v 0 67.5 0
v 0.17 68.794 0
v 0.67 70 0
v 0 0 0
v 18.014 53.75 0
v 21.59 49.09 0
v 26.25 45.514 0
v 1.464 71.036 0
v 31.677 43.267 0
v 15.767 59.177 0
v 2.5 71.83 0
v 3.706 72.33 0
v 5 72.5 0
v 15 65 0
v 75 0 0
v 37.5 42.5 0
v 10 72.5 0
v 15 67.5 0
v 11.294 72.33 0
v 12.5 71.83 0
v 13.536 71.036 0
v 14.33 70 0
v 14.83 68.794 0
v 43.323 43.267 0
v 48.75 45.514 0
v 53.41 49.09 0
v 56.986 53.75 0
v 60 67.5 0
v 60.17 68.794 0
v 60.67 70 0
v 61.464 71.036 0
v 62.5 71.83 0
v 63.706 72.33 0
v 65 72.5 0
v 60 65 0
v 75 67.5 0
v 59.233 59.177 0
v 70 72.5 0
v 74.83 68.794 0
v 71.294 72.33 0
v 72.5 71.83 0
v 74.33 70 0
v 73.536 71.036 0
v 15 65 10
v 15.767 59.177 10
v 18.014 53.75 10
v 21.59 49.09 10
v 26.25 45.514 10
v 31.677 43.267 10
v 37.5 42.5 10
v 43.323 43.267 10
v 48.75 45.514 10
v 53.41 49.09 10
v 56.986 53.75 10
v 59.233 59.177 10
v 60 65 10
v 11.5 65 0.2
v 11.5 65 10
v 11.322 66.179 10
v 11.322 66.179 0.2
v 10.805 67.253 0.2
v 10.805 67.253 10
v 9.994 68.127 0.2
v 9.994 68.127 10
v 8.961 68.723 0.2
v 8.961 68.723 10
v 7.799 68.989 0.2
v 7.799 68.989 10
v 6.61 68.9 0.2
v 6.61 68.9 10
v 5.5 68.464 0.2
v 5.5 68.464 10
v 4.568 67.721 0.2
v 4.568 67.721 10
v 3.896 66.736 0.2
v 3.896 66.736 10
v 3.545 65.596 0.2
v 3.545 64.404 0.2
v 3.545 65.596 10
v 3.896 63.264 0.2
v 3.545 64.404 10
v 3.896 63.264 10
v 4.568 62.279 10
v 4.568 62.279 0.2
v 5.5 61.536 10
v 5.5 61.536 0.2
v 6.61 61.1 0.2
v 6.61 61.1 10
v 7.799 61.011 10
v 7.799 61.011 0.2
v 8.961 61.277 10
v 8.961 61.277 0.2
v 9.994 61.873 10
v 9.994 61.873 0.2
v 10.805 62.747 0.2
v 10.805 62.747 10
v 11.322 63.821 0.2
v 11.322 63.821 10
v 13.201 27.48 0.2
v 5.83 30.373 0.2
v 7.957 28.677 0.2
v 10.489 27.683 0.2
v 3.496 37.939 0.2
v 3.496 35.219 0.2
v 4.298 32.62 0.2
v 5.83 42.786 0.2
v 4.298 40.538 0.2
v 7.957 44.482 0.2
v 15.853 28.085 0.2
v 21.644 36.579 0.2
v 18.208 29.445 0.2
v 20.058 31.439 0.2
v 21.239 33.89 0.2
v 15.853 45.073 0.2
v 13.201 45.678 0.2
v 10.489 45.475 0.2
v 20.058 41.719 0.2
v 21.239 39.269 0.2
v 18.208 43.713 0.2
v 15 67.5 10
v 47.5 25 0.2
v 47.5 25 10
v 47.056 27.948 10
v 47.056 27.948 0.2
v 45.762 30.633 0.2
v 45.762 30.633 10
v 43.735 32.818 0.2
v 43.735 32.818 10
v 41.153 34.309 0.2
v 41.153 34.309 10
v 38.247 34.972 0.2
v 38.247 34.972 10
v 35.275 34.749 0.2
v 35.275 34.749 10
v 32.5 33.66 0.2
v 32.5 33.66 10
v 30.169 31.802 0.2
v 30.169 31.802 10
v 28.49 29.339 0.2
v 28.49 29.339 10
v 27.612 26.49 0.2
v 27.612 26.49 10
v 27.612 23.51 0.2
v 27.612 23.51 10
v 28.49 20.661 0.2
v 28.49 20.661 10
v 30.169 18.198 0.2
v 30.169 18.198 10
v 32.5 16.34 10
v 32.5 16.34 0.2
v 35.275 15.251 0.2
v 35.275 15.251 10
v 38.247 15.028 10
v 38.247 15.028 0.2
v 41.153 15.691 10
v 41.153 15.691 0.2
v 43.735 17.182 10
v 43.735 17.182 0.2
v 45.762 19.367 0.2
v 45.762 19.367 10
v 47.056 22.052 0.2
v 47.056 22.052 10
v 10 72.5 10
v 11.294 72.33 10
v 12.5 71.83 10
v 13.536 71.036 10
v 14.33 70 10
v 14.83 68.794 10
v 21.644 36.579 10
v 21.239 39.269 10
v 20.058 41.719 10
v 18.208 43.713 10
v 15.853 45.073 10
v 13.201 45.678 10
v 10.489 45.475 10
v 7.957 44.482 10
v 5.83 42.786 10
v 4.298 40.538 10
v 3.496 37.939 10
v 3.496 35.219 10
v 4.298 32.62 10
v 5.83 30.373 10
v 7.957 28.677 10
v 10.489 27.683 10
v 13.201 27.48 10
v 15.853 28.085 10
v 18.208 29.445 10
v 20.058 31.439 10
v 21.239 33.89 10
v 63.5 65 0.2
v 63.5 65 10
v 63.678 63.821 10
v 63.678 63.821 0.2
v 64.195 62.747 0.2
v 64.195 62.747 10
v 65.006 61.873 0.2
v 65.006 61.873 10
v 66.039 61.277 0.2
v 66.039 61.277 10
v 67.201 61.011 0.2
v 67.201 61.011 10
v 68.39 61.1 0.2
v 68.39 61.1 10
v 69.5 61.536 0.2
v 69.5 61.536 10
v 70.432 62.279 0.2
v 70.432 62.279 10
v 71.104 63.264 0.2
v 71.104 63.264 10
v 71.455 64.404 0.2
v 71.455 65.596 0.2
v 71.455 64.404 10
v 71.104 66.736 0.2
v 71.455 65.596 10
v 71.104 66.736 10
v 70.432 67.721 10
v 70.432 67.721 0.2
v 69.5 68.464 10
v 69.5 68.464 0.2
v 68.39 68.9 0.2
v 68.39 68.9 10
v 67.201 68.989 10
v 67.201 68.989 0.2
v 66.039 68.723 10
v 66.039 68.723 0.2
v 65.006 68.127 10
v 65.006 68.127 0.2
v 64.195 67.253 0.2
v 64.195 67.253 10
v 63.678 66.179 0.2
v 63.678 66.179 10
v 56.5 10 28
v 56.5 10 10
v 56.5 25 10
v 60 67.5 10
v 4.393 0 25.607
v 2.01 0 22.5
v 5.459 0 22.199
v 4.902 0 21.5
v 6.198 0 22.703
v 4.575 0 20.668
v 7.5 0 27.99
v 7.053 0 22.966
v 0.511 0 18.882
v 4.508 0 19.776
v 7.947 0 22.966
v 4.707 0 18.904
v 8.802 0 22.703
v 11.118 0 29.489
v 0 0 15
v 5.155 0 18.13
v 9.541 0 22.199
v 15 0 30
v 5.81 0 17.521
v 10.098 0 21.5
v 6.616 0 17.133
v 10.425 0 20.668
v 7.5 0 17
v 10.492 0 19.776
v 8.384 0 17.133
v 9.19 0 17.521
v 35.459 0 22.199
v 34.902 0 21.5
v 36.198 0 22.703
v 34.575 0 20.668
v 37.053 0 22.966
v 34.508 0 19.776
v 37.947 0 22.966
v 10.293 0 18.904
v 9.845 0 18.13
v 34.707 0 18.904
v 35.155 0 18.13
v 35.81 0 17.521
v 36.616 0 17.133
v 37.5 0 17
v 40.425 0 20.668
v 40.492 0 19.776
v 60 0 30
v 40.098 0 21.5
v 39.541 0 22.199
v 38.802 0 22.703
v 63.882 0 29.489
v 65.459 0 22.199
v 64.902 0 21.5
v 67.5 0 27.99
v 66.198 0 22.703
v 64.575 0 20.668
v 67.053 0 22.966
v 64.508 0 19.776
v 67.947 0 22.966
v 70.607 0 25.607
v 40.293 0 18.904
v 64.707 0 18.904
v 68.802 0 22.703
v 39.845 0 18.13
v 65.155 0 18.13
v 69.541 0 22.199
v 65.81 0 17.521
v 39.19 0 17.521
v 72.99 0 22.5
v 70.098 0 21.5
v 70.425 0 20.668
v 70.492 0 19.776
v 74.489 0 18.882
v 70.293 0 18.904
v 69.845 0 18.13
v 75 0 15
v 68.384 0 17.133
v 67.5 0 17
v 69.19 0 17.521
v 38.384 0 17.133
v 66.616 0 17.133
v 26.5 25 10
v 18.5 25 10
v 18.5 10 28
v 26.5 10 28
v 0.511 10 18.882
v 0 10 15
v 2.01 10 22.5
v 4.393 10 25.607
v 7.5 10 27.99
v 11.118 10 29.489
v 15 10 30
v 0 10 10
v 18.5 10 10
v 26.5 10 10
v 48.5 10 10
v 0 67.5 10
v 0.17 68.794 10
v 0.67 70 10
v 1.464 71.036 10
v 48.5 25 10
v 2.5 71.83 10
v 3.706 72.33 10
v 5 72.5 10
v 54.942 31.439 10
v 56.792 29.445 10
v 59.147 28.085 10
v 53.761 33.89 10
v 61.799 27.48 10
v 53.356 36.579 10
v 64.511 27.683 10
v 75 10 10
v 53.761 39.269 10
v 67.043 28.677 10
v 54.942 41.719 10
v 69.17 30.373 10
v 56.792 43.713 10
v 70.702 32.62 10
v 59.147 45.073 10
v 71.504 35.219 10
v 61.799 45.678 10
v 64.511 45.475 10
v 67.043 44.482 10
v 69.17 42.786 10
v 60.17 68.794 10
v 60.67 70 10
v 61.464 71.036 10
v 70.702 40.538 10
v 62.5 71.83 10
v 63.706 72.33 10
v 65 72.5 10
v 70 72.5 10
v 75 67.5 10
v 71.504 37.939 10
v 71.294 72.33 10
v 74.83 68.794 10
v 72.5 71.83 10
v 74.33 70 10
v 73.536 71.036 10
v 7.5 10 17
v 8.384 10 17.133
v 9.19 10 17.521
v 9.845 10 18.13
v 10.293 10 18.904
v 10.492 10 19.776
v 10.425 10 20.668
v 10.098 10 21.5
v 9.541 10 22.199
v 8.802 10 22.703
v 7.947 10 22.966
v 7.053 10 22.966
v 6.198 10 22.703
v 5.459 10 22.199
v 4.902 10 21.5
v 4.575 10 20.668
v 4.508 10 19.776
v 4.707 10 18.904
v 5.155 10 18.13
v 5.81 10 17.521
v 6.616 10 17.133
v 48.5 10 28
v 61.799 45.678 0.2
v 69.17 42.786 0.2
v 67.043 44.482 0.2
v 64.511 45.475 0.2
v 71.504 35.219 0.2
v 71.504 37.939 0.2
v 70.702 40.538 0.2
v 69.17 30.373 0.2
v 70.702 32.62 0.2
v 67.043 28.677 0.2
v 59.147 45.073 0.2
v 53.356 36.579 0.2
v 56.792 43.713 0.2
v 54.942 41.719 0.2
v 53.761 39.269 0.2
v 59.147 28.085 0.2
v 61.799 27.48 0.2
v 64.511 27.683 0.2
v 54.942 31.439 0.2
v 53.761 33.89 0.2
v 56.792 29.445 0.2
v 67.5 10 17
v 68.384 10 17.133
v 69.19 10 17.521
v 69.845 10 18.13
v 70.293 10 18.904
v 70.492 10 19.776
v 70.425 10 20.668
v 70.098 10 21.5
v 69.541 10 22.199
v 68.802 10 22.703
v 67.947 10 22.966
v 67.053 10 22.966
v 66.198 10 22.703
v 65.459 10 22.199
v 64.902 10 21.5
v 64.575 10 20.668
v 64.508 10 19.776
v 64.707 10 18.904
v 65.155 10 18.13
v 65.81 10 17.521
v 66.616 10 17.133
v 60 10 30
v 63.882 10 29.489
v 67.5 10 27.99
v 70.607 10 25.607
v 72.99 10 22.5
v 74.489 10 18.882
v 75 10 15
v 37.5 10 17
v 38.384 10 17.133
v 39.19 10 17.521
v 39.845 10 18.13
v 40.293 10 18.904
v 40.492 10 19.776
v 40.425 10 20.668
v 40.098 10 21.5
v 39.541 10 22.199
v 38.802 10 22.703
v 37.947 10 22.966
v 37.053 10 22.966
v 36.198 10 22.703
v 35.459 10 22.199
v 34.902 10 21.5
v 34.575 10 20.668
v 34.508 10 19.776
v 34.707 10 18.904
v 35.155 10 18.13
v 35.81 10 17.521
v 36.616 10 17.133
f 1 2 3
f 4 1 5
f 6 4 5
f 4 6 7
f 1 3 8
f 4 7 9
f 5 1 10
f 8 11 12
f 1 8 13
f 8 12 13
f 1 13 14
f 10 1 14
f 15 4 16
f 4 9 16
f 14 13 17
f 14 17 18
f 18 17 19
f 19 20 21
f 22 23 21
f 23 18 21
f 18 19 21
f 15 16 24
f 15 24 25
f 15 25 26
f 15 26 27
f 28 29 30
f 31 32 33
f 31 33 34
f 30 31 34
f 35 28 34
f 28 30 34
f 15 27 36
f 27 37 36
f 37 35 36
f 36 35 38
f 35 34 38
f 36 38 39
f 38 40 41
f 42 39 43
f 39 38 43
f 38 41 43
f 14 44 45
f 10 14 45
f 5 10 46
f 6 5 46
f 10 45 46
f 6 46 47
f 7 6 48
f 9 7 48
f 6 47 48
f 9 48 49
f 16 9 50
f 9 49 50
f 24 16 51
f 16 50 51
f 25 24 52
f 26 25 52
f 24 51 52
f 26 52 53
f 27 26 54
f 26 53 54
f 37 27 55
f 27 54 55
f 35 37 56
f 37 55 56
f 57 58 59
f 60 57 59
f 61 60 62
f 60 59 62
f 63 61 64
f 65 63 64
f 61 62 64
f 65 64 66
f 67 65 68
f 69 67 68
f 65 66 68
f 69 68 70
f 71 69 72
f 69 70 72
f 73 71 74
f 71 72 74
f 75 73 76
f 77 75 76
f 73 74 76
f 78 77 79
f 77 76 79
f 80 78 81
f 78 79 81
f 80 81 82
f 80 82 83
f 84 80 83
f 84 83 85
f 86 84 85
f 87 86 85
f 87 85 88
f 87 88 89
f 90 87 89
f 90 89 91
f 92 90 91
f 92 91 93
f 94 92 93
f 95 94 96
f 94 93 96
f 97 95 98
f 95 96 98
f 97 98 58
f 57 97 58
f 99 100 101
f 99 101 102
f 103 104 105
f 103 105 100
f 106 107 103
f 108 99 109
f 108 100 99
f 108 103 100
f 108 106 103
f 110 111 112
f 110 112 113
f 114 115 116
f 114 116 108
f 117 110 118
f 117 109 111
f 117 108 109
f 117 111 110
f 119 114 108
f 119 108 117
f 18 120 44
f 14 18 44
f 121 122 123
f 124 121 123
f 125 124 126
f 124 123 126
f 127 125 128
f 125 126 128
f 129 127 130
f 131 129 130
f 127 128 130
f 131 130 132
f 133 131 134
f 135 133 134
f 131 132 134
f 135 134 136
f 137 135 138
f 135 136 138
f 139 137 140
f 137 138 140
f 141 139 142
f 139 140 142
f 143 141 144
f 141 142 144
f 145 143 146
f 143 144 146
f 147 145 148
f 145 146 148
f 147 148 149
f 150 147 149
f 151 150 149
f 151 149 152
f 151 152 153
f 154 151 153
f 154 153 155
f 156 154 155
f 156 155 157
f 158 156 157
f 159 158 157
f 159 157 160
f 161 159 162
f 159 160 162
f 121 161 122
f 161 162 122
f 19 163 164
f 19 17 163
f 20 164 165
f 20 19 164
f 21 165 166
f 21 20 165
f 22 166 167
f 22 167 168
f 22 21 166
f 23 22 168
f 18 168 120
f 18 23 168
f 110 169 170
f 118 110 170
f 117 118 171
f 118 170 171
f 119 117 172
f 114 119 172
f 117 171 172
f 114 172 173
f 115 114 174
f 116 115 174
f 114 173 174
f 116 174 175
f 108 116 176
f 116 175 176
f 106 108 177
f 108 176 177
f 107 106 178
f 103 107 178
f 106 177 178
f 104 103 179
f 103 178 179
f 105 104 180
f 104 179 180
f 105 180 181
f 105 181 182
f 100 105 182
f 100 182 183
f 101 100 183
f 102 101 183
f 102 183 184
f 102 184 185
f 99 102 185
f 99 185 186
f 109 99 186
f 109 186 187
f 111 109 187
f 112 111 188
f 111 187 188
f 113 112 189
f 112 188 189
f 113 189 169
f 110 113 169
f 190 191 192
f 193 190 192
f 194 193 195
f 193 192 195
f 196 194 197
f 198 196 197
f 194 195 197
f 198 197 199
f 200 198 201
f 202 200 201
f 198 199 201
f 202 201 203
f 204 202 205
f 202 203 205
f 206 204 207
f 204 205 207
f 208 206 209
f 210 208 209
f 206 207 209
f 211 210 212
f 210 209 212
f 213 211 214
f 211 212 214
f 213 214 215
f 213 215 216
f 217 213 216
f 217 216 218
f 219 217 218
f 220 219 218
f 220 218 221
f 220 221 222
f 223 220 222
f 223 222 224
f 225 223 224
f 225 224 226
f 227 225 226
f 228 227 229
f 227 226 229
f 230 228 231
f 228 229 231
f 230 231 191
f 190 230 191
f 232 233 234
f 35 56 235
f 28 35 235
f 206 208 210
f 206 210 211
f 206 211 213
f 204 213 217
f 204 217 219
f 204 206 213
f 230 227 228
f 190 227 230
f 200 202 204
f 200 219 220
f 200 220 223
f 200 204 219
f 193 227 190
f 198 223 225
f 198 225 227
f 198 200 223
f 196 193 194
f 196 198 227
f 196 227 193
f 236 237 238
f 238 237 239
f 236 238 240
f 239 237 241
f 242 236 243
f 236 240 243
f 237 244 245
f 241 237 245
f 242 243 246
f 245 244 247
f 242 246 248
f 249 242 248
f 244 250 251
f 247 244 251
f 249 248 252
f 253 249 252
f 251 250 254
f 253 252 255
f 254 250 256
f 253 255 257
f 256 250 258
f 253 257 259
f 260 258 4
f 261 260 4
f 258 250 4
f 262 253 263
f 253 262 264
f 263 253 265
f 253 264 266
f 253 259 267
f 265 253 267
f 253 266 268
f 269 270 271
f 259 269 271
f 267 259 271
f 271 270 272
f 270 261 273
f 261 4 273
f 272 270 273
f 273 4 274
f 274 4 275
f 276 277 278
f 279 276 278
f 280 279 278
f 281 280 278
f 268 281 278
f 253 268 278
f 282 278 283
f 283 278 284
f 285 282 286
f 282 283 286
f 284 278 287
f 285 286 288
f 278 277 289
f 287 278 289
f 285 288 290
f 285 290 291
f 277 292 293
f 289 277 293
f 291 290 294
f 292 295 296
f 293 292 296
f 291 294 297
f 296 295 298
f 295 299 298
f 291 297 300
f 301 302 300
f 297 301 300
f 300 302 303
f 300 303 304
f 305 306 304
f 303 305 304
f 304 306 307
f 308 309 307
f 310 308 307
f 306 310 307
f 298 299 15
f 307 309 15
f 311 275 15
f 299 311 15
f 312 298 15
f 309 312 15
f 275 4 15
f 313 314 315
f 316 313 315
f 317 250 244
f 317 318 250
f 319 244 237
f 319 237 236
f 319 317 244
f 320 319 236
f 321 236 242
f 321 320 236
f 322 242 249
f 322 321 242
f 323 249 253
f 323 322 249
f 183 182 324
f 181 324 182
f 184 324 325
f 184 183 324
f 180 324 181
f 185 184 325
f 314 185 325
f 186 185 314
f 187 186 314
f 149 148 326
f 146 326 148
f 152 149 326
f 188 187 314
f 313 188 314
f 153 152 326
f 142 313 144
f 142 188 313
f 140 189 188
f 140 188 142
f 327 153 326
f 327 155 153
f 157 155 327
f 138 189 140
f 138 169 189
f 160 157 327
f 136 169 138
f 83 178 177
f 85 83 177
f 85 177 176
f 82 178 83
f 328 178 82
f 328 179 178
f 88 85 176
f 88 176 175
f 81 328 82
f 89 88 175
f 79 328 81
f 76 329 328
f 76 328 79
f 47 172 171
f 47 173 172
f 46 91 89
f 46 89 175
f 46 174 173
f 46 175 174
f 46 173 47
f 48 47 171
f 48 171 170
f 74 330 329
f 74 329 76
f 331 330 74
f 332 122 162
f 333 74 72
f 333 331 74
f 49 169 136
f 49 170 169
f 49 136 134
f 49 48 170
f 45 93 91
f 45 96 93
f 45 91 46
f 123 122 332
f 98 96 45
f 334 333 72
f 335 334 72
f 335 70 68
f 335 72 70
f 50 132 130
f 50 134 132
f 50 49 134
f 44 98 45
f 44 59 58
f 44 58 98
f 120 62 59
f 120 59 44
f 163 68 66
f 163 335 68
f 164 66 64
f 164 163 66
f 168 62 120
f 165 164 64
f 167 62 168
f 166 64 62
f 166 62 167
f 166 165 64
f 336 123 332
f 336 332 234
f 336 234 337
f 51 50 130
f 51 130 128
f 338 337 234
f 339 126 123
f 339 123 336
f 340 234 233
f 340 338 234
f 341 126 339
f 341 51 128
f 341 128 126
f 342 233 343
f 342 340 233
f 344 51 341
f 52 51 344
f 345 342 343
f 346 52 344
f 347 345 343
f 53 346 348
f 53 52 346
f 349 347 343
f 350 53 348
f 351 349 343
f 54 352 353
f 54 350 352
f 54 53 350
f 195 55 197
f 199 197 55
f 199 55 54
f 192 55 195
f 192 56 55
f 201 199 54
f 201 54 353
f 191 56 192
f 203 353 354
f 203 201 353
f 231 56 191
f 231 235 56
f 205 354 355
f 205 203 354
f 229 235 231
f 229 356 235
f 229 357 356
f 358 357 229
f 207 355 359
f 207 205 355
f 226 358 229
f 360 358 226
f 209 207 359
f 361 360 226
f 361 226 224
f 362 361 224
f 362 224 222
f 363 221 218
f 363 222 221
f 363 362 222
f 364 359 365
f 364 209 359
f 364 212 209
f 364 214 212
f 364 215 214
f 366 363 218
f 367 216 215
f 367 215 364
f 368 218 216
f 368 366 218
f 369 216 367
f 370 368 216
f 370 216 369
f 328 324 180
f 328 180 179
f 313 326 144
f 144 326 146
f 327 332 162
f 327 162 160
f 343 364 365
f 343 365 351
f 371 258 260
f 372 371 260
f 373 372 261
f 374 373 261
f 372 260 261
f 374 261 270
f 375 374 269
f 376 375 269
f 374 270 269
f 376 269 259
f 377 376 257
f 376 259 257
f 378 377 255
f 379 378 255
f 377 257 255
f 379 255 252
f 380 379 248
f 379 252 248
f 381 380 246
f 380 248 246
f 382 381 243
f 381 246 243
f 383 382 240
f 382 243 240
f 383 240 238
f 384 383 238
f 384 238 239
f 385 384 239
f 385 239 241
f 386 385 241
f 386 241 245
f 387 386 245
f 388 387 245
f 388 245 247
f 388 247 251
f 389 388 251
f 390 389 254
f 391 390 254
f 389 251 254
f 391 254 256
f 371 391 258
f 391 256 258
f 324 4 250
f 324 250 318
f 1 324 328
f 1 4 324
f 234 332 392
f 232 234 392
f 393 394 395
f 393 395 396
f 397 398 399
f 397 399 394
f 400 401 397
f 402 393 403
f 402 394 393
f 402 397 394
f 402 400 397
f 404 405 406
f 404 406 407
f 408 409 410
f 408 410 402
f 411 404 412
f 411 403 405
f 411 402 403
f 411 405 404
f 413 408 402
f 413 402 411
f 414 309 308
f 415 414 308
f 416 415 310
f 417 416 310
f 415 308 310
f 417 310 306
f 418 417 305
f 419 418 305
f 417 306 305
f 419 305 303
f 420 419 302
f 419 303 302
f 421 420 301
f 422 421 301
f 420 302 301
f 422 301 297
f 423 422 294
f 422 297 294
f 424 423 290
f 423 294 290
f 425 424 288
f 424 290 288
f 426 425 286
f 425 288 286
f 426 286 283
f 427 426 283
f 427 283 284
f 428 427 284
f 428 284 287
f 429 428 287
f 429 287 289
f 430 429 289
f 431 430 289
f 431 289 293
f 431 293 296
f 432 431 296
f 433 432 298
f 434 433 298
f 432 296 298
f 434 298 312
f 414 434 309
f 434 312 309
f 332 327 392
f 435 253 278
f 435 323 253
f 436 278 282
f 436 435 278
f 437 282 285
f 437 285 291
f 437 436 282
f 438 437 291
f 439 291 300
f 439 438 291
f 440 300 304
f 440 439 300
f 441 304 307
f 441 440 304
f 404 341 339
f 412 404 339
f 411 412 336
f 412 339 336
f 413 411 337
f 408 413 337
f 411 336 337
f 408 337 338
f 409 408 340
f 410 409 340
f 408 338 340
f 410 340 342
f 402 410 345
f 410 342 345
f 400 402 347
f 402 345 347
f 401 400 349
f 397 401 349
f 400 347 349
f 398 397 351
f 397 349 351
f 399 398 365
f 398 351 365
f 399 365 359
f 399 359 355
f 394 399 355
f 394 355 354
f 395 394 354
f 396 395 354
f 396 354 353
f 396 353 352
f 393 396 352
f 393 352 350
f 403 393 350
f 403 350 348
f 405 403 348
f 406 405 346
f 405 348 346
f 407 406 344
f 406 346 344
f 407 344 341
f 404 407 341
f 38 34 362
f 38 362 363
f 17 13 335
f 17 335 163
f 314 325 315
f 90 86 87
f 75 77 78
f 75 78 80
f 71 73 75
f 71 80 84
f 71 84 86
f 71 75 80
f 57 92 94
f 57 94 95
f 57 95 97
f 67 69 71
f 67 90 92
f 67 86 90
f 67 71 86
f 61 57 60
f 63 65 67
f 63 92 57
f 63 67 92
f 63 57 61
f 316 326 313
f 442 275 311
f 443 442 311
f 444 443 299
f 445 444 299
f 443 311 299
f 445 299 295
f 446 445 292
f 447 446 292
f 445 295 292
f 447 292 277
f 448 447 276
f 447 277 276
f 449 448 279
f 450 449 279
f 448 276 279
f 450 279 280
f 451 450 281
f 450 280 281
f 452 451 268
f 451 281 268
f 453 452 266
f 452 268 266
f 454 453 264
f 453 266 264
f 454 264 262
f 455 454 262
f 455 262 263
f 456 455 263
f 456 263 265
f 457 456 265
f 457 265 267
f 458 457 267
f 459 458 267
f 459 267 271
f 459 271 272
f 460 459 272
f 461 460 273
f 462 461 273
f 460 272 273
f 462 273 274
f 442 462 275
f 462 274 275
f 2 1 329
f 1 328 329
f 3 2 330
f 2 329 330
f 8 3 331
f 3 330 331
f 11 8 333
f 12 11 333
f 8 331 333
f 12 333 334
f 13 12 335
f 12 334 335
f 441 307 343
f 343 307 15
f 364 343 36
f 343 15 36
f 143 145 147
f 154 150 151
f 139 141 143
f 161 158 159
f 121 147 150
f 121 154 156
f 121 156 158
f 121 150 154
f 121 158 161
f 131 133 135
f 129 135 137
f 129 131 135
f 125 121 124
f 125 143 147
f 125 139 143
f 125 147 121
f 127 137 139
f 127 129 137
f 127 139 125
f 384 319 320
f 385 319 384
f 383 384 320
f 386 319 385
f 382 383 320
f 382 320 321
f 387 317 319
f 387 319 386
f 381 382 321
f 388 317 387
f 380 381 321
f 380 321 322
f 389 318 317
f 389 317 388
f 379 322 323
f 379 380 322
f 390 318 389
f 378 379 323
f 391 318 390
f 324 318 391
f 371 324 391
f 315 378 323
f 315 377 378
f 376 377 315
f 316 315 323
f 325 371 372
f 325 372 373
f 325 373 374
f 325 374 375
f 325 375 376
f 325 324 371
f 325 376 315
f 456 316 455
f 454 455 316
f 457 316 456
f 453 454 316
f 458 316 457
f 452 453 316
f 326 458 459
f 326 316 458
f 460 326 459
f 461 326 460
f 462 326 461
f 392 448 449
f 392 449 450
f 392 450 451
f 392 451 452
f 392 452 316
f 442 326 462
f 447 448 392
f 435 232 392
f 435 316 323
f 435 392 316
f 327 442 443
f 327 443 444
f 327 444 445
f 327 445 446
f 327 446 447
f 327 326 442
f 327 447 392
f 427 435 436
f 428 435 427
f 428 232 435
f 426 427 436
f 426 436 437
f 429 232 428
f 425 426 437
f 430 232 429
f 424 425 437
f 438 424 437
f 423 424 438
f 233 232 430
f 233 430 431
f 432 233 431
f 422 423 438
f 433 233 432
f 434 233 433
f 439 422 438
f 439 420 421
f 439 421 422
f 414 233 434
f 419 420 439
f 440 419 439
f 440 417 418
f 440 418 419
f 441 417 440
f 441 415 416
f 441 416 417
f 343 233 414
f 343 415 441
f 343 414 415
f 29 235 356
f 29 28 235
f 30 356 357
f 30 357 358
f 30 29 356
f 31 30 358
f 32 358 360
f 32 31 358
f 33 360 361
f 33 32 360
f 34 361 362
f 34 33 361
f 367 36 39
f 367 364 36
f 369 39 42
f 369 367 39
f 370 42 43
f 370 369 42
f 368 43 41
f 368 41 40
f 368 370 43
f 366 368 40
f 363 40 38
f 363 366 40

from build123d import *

# Parameters (mm, degrees)
SKETCH1_W           = 75
SKETCH1_H           = 72.5
BOSS_EXTRUDE1_DEPTH = 10
CUT_EXTRUDE1_DEPTH  = 10
SKETCH3_W           = 75
SKETCH3_H           = 10
FEET_DEPTH          = 20
SKETCH4_R           = 3
FEET_HOLE_DEPTH     = 10
SKETCH6_W           = 8
SKETCH6_H           = 15
BOSS_EXTRUDE2_DEPTH = 18
CUT_EXTRUDE2_DEPTH  = 97.687641403
SKETCH5_R           = 4
SKETCH5_R_2         = 10
SKETCH5_R_3         = 9.124733902
CUT_EXTRUDE3_DEPTH  = 9.8
FILLET1_R           = 5
FILLET2_R           = 15


with BuildPart() as part:
    # Sketch1 → Boss-Extrude1 (new body)
    with BuildSketch(Plane.XY):
        with Locations((37.5, 36.25)):
            Rectangle(SKETCH1_W, SKETCH1_H)
    extrude(amount=BOSS_EXTRUDE1_DEPTH)

    # Sketch2 → Cut-Extrude1 (cut)
    with BuildSketch(Plane.XY.offset(10)):
        with BuildLine():
            Line((60, 65), (60, 72.5))
            Line((60, 72.5), (15, 72.5))
            Line((15, 72.5), (15, 65))
            ThreePointArc((15, 65), (37.5, 42.5), (60, 65))
        make_face()
    extrude(amount=-CUT_EXTRUDE1_DEPTH, mode=Mode.SUBTRACT)

    # Sketch3 → feet (add)
    with BuildSketch(Plane.XY.offset(10)):
        with Locations((37.5, 5)):
            Rectangle(SKETCH3_W, SKETCH3_H)
    extrude(amount=FEET_DEPTH)

    # Sketch4 → feet-hole (cut)
    with BuildSketch(Plane.XZ):
        with Locations(Location((7.5, 20, 0), (0, 0, 270))):
            Circle(SKETCH4_R)
        with Locations(Location((67.5, 20, 0), (0, 0, 270))):
            Circle(SKETCH4_R)
        with Locations(Location((37.5, 20, 0), (0, 0, 270))):
            Circle(SKETCH4_R)
    extrude(amount=-FEET_HOLE_DEPTH, mode=Mode.SUBTRACT)

    # Sketch6 → Boss-Extrude2 (add)
    with BuildSketch(Plane.XY.offset(10)):
        with Locations((22.5, 17.5)):
            Rectangle(SKETCH6_W, SKETCH6_H)
        with Locations((52.5, 17.5)):
            Rectangle(SKETCH6_W, SKETCH6_H)
    extrude(amount=BOSS_EXTRUDE2_DEPTH)

    # Sketch7 → Cut-Extrude2 (cut, through all)
    with BuildSketch(Plane.ZY.offset(-18.5)):
        Polygon((10, 25), (28, 10), (28, 25), align=None)
    extrude(amount=-CUT_EXTRUDE2_DEPTH, mode=Mode.SUBTRACT)

    # Sketch5 → Cut-Extrude3 (cut)
    with BuildSketch(Plane.XY.offset(10)):
        with Locations((7.5, 65)):
            Circle(SKETCH5_R)
        with Locations(Location((67.5, 65, 0), (0, 0, 180))):
            Circle(SKETCH5_R)
        with Locations((37.5, 25)):
            Circle(SKETCH5_R_2)
        with Locations((12.51923423, 36.579255476)):
            Circle(SKETCH5_R_3)
        with Locations(Location((62.48076577, 36.579255476, 0), (0, 0, 180))):
            Circle(SKETCH5_R_3)
    extrude(amount=-CUT_EXTRUDE3_DEPTH, mode=Mode.SUBTRACT)

    # Fillet1
    fillet1_edges = [part.edges().sort_by_distance(p)[0] for p in [
        (0, 72.5, 5),
        (15, 72.5, 5),
        (60, 72.5, 5),
        (75, 72.5, 5),
    ]]
    fillet(fillet1_edges, radius=FILLET1_R)

    # Fillet2
    fillet2_edges = [part.edges().sort_by_distance(p)[0] for p in [
        (0, 5, 30),
        (75, 5, 30),
    ]]
    fillet(fillet2_edges, radius=FILLET2_R)


solid = part.part
